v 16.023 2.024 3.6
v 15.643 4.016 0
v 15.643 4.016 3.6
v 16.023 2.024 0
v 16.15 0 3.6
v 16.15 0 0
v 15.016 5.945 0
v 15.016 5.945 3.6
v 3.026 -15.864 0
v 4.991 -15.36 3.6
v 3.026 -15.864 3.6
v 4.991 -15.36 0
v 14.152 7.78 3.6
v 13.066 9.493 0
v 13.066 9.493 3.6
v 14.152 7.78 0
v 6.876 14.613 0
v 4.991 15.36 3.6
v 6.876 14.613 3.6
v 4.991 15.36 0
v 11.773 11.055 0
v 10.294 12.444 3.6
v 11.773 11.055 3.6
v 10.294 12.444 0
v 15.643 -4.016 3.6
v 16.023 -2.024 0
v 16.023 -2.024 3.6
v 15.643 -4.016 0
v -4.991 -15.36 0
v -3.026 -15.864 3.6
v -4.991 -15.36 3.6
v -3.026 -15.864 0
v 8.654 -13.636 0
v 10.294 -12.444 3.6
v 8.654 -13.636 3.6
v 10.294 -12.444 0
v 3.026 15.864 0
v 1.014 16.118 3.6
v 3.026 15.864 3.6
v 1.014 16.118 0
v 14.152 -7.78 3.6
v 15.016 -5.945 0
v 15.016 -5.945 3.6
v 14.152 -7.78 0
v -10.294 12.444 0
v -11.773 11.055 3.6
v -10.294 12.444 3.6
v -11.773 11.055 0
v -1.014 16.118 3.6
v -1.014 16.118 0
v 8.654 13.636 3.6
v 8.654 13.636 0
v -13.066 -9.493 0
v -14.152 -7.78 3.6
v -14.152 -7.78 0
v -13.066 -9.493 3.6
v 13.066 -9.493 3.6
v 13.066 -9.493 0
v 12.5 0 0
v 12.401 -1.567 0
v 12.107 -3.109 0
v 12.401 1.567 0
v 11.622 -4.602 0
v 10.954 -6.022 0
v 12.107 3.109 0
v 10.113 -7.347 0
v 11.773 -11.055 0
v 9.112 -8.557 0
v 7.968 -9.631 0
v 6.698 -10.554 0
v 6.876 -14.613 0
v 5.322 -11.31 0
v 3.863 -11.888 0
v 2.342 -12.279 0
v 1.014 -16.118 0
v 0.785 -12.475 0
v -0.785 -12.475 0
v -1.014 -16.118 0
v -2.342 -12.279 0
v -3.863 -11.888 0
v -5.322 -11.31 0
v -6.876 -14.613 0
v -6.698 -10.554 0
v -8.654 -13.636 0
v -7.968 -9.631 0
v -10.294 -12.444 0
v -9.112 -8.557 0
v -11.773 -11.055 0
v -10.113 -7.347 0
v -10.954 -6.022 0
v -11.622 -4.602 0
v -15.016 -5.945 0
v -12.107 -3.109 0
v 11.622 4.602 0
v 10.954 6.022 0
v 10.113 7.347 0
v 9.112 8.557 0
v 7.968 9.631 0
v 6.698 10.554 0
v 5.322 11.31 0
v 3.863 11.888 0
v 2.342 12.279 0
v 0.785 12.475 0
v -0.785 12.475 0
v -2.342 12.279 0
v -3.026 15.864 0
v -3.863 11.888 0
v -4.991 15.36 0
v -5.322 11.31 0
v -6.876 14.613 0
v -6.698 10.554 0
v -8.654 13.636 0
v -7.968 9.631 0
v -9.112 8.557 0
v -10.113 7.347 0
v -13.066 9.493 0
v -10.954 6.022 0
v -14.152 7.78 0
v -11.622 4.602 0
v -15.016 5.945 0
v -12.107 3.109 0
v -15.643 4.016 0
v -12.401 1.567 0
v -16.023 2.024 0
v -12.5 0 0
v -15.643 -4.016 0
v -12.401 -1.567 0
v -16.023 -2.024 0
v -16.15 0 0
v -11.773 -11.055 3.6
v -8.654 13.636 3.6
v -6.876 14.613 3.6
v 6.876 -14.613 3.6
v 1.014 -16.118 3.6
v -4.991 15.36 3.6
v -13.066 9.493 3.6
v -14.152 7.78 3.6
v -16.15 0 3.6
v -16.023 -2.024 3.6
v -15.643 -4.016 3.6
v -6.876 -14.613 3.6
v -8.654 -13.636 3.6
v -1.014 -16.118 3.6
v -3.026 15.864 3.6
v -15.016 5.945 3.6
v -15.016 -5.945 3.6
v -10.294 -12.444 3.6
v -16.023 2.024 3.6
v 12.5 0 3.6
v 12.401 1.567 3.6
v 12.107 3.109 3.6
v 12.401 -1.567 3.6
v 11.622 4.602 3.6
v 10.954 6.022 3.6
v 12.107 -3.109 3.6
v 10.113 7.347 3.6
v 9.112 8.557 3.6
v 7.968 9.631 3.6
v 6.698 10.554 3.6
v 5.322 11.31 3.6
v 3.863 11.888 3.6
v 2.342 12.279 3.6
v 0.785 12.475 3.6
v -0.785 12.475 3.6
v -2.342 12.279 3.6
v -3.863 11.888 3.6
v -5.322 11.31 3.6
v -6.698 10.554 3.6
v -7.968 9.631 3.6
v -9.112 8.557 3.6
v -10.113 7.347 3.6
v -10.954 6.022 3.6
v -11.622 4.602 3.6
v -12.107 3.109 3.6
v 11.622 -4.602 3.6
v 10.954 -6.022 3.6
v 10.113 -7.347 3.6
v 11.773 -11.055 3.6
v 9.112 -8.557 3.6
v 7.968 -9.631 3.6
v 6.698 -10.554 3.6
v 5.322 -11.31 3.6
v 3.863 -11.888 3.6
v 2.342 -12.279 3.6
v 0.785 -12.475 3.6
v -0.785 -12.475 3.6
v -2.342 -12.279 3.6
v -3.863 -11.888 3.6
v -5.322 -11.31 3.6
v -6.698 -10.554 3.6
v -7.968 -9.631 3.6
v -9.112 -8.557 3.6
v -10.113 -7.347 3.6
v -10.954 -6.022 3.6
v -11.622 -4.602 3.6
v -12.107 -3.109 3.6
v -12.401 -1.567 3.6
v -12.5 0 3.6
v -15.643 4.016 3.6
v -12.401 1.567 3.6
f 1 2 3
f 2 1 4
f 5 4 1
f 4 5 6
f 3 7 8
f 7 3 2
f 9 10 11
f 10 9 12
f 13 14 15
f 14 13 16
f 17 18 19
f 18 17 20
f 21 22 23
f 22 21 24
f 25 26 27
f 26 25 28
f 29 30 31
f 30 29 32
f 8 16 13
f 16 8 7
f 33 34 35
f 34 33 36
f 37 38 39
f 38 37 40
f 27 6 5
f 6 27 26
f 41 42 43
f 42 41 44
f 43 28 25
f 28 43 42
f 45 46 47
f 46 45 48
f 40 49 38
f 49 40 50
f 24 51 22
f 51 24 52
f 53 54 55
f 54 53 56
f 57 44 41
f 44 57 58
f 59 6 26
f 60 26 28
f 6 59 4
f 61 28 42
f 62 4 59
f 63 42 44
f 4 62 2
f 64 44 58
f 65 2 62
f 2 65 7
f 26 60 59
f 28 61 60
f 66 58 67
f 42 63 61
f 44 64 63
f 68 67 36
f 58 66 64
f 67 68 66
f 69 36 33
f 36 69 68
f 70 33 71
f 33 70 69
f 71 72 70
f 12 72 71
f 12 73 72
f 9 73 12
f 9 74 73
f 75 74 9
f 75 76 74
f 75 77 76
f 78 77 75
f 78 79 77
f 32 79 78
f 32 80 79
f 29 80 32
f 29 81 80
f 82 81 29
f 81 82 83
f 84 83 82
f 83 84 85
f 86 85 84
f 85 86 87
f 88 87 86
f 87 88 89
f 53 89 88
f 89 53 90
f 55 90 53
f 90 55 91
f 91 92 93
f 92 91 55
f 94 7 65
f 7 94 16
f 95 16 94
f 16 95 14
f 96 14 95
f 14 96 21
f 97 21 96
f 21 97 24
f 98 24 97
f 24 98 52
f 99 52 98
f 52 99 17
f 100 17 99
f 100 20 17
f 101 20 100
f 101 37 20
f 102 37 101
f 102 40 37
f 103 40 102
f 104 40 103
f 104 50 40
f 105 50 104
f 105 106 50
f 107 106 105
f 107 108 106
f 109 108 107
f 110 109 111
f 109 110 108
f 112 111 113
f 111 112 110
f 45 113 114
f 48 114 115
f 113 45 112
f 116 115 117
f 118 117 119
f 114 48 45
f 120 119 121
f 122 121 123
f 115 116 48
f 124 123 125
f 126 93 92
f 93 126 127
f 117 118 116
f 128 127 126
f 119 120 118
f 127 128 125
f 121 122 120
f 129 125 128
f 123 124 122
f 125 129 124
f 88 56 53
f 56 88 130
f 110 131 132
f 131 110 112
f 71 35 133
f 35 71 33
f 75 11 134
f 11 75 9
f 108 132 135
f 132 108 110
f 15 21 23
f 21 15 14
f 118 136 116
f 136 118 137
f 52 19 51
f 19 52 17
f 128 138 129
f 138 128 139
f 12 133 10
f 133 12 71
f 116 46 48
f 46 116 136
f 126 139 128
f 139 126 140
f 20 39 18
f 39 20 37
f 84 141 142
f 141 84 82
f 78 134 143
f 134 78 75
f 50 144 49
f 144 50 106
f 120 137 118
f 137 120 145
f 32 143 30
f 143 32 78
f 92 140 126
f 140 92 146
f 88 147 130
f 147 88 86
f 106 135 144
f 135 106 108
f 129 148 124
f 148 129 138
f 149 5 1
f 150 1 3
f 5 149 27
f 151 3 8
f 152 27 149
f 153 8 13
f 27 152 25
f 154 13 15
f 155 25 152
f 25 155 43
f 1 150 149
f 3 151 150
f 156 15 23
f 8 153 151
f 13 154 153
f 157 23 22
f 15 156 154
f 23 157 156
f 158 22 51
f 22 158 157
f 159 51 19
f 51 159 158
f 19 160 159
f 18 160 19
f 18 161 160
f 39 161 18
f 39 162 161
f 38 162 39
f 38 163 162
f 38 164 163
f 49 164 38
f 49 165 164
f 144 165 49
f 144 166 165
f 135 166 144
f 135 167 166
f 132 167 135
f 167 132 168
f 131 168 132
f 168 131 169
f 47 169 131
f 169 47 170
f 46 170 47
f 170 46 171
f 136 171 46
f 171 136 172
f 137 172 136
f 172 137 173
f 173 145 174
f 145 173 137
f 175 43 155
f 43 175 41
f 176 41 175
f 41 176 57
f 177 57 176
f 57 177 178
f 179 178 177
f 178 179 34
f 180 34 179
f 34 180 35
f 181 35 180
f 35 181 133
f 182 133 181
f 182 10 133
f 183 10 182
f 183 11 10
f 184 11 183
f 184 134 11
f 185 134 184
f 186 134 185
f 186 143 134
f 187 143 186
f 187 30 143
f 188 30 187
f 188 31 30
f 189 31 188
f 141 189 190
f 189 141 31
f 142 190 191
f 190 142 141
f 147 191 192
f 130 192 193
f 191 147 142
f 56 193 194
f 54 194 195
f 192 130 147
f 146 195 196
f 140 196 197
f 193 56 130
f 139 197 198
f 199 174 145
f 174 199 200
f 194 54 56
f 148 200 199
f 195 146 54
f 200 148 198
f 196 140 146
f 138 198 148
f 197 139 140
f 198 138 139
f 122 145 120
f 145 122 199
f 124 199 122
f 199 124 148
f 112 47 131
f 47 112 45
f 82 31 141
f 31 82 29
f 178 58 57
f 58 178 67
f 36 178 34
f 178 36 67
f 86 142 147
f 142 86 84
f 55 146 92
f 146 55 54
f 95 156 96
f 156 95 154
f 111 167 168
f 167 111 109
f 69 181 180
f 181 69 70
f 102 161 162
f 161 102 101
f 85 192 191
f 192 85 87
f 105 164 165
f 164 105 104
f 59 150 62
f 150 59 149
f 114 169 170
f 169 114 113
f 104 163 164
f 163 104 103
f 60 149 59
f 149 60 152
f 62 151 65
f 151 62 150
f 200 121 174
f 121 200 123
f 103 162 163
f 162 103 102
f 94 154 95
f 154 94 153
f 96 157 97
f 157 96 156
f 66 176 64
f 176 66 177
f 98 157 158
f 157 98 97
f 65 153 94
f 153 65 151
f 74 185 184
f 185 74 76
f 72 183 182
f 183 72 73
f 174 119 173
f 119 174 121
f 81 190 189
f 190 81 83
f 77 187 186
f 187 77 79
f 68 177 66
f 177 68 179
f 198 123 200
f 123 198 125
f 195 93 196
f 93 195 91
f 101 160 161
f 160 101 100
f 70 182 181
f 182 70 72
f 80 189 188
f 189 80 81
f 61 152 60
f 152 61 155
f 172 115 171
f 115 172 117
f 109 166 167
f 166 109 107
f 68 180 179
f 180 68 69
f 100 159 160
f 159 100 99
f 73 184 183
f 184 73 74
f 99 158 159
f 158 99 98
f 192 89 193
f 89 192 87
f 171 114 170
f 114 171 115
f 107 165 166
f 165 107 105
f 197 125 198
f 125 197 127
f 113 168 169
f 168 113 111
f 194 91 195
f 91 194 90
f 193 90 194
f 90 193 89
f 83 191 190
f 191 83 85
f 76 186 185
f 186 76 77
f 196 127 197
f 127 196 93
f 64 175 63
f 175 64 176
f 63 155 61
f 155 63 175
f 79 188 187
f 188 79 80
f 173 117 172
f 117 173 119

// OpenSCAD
$fn = 50;


difference() {
	union() {
		cylinder(h = 3.6000000000, r = 16.1500000000);
	}
	union() {
		cylinder(h = 3.6000000000, r = 12.5000000000);
	}
}
